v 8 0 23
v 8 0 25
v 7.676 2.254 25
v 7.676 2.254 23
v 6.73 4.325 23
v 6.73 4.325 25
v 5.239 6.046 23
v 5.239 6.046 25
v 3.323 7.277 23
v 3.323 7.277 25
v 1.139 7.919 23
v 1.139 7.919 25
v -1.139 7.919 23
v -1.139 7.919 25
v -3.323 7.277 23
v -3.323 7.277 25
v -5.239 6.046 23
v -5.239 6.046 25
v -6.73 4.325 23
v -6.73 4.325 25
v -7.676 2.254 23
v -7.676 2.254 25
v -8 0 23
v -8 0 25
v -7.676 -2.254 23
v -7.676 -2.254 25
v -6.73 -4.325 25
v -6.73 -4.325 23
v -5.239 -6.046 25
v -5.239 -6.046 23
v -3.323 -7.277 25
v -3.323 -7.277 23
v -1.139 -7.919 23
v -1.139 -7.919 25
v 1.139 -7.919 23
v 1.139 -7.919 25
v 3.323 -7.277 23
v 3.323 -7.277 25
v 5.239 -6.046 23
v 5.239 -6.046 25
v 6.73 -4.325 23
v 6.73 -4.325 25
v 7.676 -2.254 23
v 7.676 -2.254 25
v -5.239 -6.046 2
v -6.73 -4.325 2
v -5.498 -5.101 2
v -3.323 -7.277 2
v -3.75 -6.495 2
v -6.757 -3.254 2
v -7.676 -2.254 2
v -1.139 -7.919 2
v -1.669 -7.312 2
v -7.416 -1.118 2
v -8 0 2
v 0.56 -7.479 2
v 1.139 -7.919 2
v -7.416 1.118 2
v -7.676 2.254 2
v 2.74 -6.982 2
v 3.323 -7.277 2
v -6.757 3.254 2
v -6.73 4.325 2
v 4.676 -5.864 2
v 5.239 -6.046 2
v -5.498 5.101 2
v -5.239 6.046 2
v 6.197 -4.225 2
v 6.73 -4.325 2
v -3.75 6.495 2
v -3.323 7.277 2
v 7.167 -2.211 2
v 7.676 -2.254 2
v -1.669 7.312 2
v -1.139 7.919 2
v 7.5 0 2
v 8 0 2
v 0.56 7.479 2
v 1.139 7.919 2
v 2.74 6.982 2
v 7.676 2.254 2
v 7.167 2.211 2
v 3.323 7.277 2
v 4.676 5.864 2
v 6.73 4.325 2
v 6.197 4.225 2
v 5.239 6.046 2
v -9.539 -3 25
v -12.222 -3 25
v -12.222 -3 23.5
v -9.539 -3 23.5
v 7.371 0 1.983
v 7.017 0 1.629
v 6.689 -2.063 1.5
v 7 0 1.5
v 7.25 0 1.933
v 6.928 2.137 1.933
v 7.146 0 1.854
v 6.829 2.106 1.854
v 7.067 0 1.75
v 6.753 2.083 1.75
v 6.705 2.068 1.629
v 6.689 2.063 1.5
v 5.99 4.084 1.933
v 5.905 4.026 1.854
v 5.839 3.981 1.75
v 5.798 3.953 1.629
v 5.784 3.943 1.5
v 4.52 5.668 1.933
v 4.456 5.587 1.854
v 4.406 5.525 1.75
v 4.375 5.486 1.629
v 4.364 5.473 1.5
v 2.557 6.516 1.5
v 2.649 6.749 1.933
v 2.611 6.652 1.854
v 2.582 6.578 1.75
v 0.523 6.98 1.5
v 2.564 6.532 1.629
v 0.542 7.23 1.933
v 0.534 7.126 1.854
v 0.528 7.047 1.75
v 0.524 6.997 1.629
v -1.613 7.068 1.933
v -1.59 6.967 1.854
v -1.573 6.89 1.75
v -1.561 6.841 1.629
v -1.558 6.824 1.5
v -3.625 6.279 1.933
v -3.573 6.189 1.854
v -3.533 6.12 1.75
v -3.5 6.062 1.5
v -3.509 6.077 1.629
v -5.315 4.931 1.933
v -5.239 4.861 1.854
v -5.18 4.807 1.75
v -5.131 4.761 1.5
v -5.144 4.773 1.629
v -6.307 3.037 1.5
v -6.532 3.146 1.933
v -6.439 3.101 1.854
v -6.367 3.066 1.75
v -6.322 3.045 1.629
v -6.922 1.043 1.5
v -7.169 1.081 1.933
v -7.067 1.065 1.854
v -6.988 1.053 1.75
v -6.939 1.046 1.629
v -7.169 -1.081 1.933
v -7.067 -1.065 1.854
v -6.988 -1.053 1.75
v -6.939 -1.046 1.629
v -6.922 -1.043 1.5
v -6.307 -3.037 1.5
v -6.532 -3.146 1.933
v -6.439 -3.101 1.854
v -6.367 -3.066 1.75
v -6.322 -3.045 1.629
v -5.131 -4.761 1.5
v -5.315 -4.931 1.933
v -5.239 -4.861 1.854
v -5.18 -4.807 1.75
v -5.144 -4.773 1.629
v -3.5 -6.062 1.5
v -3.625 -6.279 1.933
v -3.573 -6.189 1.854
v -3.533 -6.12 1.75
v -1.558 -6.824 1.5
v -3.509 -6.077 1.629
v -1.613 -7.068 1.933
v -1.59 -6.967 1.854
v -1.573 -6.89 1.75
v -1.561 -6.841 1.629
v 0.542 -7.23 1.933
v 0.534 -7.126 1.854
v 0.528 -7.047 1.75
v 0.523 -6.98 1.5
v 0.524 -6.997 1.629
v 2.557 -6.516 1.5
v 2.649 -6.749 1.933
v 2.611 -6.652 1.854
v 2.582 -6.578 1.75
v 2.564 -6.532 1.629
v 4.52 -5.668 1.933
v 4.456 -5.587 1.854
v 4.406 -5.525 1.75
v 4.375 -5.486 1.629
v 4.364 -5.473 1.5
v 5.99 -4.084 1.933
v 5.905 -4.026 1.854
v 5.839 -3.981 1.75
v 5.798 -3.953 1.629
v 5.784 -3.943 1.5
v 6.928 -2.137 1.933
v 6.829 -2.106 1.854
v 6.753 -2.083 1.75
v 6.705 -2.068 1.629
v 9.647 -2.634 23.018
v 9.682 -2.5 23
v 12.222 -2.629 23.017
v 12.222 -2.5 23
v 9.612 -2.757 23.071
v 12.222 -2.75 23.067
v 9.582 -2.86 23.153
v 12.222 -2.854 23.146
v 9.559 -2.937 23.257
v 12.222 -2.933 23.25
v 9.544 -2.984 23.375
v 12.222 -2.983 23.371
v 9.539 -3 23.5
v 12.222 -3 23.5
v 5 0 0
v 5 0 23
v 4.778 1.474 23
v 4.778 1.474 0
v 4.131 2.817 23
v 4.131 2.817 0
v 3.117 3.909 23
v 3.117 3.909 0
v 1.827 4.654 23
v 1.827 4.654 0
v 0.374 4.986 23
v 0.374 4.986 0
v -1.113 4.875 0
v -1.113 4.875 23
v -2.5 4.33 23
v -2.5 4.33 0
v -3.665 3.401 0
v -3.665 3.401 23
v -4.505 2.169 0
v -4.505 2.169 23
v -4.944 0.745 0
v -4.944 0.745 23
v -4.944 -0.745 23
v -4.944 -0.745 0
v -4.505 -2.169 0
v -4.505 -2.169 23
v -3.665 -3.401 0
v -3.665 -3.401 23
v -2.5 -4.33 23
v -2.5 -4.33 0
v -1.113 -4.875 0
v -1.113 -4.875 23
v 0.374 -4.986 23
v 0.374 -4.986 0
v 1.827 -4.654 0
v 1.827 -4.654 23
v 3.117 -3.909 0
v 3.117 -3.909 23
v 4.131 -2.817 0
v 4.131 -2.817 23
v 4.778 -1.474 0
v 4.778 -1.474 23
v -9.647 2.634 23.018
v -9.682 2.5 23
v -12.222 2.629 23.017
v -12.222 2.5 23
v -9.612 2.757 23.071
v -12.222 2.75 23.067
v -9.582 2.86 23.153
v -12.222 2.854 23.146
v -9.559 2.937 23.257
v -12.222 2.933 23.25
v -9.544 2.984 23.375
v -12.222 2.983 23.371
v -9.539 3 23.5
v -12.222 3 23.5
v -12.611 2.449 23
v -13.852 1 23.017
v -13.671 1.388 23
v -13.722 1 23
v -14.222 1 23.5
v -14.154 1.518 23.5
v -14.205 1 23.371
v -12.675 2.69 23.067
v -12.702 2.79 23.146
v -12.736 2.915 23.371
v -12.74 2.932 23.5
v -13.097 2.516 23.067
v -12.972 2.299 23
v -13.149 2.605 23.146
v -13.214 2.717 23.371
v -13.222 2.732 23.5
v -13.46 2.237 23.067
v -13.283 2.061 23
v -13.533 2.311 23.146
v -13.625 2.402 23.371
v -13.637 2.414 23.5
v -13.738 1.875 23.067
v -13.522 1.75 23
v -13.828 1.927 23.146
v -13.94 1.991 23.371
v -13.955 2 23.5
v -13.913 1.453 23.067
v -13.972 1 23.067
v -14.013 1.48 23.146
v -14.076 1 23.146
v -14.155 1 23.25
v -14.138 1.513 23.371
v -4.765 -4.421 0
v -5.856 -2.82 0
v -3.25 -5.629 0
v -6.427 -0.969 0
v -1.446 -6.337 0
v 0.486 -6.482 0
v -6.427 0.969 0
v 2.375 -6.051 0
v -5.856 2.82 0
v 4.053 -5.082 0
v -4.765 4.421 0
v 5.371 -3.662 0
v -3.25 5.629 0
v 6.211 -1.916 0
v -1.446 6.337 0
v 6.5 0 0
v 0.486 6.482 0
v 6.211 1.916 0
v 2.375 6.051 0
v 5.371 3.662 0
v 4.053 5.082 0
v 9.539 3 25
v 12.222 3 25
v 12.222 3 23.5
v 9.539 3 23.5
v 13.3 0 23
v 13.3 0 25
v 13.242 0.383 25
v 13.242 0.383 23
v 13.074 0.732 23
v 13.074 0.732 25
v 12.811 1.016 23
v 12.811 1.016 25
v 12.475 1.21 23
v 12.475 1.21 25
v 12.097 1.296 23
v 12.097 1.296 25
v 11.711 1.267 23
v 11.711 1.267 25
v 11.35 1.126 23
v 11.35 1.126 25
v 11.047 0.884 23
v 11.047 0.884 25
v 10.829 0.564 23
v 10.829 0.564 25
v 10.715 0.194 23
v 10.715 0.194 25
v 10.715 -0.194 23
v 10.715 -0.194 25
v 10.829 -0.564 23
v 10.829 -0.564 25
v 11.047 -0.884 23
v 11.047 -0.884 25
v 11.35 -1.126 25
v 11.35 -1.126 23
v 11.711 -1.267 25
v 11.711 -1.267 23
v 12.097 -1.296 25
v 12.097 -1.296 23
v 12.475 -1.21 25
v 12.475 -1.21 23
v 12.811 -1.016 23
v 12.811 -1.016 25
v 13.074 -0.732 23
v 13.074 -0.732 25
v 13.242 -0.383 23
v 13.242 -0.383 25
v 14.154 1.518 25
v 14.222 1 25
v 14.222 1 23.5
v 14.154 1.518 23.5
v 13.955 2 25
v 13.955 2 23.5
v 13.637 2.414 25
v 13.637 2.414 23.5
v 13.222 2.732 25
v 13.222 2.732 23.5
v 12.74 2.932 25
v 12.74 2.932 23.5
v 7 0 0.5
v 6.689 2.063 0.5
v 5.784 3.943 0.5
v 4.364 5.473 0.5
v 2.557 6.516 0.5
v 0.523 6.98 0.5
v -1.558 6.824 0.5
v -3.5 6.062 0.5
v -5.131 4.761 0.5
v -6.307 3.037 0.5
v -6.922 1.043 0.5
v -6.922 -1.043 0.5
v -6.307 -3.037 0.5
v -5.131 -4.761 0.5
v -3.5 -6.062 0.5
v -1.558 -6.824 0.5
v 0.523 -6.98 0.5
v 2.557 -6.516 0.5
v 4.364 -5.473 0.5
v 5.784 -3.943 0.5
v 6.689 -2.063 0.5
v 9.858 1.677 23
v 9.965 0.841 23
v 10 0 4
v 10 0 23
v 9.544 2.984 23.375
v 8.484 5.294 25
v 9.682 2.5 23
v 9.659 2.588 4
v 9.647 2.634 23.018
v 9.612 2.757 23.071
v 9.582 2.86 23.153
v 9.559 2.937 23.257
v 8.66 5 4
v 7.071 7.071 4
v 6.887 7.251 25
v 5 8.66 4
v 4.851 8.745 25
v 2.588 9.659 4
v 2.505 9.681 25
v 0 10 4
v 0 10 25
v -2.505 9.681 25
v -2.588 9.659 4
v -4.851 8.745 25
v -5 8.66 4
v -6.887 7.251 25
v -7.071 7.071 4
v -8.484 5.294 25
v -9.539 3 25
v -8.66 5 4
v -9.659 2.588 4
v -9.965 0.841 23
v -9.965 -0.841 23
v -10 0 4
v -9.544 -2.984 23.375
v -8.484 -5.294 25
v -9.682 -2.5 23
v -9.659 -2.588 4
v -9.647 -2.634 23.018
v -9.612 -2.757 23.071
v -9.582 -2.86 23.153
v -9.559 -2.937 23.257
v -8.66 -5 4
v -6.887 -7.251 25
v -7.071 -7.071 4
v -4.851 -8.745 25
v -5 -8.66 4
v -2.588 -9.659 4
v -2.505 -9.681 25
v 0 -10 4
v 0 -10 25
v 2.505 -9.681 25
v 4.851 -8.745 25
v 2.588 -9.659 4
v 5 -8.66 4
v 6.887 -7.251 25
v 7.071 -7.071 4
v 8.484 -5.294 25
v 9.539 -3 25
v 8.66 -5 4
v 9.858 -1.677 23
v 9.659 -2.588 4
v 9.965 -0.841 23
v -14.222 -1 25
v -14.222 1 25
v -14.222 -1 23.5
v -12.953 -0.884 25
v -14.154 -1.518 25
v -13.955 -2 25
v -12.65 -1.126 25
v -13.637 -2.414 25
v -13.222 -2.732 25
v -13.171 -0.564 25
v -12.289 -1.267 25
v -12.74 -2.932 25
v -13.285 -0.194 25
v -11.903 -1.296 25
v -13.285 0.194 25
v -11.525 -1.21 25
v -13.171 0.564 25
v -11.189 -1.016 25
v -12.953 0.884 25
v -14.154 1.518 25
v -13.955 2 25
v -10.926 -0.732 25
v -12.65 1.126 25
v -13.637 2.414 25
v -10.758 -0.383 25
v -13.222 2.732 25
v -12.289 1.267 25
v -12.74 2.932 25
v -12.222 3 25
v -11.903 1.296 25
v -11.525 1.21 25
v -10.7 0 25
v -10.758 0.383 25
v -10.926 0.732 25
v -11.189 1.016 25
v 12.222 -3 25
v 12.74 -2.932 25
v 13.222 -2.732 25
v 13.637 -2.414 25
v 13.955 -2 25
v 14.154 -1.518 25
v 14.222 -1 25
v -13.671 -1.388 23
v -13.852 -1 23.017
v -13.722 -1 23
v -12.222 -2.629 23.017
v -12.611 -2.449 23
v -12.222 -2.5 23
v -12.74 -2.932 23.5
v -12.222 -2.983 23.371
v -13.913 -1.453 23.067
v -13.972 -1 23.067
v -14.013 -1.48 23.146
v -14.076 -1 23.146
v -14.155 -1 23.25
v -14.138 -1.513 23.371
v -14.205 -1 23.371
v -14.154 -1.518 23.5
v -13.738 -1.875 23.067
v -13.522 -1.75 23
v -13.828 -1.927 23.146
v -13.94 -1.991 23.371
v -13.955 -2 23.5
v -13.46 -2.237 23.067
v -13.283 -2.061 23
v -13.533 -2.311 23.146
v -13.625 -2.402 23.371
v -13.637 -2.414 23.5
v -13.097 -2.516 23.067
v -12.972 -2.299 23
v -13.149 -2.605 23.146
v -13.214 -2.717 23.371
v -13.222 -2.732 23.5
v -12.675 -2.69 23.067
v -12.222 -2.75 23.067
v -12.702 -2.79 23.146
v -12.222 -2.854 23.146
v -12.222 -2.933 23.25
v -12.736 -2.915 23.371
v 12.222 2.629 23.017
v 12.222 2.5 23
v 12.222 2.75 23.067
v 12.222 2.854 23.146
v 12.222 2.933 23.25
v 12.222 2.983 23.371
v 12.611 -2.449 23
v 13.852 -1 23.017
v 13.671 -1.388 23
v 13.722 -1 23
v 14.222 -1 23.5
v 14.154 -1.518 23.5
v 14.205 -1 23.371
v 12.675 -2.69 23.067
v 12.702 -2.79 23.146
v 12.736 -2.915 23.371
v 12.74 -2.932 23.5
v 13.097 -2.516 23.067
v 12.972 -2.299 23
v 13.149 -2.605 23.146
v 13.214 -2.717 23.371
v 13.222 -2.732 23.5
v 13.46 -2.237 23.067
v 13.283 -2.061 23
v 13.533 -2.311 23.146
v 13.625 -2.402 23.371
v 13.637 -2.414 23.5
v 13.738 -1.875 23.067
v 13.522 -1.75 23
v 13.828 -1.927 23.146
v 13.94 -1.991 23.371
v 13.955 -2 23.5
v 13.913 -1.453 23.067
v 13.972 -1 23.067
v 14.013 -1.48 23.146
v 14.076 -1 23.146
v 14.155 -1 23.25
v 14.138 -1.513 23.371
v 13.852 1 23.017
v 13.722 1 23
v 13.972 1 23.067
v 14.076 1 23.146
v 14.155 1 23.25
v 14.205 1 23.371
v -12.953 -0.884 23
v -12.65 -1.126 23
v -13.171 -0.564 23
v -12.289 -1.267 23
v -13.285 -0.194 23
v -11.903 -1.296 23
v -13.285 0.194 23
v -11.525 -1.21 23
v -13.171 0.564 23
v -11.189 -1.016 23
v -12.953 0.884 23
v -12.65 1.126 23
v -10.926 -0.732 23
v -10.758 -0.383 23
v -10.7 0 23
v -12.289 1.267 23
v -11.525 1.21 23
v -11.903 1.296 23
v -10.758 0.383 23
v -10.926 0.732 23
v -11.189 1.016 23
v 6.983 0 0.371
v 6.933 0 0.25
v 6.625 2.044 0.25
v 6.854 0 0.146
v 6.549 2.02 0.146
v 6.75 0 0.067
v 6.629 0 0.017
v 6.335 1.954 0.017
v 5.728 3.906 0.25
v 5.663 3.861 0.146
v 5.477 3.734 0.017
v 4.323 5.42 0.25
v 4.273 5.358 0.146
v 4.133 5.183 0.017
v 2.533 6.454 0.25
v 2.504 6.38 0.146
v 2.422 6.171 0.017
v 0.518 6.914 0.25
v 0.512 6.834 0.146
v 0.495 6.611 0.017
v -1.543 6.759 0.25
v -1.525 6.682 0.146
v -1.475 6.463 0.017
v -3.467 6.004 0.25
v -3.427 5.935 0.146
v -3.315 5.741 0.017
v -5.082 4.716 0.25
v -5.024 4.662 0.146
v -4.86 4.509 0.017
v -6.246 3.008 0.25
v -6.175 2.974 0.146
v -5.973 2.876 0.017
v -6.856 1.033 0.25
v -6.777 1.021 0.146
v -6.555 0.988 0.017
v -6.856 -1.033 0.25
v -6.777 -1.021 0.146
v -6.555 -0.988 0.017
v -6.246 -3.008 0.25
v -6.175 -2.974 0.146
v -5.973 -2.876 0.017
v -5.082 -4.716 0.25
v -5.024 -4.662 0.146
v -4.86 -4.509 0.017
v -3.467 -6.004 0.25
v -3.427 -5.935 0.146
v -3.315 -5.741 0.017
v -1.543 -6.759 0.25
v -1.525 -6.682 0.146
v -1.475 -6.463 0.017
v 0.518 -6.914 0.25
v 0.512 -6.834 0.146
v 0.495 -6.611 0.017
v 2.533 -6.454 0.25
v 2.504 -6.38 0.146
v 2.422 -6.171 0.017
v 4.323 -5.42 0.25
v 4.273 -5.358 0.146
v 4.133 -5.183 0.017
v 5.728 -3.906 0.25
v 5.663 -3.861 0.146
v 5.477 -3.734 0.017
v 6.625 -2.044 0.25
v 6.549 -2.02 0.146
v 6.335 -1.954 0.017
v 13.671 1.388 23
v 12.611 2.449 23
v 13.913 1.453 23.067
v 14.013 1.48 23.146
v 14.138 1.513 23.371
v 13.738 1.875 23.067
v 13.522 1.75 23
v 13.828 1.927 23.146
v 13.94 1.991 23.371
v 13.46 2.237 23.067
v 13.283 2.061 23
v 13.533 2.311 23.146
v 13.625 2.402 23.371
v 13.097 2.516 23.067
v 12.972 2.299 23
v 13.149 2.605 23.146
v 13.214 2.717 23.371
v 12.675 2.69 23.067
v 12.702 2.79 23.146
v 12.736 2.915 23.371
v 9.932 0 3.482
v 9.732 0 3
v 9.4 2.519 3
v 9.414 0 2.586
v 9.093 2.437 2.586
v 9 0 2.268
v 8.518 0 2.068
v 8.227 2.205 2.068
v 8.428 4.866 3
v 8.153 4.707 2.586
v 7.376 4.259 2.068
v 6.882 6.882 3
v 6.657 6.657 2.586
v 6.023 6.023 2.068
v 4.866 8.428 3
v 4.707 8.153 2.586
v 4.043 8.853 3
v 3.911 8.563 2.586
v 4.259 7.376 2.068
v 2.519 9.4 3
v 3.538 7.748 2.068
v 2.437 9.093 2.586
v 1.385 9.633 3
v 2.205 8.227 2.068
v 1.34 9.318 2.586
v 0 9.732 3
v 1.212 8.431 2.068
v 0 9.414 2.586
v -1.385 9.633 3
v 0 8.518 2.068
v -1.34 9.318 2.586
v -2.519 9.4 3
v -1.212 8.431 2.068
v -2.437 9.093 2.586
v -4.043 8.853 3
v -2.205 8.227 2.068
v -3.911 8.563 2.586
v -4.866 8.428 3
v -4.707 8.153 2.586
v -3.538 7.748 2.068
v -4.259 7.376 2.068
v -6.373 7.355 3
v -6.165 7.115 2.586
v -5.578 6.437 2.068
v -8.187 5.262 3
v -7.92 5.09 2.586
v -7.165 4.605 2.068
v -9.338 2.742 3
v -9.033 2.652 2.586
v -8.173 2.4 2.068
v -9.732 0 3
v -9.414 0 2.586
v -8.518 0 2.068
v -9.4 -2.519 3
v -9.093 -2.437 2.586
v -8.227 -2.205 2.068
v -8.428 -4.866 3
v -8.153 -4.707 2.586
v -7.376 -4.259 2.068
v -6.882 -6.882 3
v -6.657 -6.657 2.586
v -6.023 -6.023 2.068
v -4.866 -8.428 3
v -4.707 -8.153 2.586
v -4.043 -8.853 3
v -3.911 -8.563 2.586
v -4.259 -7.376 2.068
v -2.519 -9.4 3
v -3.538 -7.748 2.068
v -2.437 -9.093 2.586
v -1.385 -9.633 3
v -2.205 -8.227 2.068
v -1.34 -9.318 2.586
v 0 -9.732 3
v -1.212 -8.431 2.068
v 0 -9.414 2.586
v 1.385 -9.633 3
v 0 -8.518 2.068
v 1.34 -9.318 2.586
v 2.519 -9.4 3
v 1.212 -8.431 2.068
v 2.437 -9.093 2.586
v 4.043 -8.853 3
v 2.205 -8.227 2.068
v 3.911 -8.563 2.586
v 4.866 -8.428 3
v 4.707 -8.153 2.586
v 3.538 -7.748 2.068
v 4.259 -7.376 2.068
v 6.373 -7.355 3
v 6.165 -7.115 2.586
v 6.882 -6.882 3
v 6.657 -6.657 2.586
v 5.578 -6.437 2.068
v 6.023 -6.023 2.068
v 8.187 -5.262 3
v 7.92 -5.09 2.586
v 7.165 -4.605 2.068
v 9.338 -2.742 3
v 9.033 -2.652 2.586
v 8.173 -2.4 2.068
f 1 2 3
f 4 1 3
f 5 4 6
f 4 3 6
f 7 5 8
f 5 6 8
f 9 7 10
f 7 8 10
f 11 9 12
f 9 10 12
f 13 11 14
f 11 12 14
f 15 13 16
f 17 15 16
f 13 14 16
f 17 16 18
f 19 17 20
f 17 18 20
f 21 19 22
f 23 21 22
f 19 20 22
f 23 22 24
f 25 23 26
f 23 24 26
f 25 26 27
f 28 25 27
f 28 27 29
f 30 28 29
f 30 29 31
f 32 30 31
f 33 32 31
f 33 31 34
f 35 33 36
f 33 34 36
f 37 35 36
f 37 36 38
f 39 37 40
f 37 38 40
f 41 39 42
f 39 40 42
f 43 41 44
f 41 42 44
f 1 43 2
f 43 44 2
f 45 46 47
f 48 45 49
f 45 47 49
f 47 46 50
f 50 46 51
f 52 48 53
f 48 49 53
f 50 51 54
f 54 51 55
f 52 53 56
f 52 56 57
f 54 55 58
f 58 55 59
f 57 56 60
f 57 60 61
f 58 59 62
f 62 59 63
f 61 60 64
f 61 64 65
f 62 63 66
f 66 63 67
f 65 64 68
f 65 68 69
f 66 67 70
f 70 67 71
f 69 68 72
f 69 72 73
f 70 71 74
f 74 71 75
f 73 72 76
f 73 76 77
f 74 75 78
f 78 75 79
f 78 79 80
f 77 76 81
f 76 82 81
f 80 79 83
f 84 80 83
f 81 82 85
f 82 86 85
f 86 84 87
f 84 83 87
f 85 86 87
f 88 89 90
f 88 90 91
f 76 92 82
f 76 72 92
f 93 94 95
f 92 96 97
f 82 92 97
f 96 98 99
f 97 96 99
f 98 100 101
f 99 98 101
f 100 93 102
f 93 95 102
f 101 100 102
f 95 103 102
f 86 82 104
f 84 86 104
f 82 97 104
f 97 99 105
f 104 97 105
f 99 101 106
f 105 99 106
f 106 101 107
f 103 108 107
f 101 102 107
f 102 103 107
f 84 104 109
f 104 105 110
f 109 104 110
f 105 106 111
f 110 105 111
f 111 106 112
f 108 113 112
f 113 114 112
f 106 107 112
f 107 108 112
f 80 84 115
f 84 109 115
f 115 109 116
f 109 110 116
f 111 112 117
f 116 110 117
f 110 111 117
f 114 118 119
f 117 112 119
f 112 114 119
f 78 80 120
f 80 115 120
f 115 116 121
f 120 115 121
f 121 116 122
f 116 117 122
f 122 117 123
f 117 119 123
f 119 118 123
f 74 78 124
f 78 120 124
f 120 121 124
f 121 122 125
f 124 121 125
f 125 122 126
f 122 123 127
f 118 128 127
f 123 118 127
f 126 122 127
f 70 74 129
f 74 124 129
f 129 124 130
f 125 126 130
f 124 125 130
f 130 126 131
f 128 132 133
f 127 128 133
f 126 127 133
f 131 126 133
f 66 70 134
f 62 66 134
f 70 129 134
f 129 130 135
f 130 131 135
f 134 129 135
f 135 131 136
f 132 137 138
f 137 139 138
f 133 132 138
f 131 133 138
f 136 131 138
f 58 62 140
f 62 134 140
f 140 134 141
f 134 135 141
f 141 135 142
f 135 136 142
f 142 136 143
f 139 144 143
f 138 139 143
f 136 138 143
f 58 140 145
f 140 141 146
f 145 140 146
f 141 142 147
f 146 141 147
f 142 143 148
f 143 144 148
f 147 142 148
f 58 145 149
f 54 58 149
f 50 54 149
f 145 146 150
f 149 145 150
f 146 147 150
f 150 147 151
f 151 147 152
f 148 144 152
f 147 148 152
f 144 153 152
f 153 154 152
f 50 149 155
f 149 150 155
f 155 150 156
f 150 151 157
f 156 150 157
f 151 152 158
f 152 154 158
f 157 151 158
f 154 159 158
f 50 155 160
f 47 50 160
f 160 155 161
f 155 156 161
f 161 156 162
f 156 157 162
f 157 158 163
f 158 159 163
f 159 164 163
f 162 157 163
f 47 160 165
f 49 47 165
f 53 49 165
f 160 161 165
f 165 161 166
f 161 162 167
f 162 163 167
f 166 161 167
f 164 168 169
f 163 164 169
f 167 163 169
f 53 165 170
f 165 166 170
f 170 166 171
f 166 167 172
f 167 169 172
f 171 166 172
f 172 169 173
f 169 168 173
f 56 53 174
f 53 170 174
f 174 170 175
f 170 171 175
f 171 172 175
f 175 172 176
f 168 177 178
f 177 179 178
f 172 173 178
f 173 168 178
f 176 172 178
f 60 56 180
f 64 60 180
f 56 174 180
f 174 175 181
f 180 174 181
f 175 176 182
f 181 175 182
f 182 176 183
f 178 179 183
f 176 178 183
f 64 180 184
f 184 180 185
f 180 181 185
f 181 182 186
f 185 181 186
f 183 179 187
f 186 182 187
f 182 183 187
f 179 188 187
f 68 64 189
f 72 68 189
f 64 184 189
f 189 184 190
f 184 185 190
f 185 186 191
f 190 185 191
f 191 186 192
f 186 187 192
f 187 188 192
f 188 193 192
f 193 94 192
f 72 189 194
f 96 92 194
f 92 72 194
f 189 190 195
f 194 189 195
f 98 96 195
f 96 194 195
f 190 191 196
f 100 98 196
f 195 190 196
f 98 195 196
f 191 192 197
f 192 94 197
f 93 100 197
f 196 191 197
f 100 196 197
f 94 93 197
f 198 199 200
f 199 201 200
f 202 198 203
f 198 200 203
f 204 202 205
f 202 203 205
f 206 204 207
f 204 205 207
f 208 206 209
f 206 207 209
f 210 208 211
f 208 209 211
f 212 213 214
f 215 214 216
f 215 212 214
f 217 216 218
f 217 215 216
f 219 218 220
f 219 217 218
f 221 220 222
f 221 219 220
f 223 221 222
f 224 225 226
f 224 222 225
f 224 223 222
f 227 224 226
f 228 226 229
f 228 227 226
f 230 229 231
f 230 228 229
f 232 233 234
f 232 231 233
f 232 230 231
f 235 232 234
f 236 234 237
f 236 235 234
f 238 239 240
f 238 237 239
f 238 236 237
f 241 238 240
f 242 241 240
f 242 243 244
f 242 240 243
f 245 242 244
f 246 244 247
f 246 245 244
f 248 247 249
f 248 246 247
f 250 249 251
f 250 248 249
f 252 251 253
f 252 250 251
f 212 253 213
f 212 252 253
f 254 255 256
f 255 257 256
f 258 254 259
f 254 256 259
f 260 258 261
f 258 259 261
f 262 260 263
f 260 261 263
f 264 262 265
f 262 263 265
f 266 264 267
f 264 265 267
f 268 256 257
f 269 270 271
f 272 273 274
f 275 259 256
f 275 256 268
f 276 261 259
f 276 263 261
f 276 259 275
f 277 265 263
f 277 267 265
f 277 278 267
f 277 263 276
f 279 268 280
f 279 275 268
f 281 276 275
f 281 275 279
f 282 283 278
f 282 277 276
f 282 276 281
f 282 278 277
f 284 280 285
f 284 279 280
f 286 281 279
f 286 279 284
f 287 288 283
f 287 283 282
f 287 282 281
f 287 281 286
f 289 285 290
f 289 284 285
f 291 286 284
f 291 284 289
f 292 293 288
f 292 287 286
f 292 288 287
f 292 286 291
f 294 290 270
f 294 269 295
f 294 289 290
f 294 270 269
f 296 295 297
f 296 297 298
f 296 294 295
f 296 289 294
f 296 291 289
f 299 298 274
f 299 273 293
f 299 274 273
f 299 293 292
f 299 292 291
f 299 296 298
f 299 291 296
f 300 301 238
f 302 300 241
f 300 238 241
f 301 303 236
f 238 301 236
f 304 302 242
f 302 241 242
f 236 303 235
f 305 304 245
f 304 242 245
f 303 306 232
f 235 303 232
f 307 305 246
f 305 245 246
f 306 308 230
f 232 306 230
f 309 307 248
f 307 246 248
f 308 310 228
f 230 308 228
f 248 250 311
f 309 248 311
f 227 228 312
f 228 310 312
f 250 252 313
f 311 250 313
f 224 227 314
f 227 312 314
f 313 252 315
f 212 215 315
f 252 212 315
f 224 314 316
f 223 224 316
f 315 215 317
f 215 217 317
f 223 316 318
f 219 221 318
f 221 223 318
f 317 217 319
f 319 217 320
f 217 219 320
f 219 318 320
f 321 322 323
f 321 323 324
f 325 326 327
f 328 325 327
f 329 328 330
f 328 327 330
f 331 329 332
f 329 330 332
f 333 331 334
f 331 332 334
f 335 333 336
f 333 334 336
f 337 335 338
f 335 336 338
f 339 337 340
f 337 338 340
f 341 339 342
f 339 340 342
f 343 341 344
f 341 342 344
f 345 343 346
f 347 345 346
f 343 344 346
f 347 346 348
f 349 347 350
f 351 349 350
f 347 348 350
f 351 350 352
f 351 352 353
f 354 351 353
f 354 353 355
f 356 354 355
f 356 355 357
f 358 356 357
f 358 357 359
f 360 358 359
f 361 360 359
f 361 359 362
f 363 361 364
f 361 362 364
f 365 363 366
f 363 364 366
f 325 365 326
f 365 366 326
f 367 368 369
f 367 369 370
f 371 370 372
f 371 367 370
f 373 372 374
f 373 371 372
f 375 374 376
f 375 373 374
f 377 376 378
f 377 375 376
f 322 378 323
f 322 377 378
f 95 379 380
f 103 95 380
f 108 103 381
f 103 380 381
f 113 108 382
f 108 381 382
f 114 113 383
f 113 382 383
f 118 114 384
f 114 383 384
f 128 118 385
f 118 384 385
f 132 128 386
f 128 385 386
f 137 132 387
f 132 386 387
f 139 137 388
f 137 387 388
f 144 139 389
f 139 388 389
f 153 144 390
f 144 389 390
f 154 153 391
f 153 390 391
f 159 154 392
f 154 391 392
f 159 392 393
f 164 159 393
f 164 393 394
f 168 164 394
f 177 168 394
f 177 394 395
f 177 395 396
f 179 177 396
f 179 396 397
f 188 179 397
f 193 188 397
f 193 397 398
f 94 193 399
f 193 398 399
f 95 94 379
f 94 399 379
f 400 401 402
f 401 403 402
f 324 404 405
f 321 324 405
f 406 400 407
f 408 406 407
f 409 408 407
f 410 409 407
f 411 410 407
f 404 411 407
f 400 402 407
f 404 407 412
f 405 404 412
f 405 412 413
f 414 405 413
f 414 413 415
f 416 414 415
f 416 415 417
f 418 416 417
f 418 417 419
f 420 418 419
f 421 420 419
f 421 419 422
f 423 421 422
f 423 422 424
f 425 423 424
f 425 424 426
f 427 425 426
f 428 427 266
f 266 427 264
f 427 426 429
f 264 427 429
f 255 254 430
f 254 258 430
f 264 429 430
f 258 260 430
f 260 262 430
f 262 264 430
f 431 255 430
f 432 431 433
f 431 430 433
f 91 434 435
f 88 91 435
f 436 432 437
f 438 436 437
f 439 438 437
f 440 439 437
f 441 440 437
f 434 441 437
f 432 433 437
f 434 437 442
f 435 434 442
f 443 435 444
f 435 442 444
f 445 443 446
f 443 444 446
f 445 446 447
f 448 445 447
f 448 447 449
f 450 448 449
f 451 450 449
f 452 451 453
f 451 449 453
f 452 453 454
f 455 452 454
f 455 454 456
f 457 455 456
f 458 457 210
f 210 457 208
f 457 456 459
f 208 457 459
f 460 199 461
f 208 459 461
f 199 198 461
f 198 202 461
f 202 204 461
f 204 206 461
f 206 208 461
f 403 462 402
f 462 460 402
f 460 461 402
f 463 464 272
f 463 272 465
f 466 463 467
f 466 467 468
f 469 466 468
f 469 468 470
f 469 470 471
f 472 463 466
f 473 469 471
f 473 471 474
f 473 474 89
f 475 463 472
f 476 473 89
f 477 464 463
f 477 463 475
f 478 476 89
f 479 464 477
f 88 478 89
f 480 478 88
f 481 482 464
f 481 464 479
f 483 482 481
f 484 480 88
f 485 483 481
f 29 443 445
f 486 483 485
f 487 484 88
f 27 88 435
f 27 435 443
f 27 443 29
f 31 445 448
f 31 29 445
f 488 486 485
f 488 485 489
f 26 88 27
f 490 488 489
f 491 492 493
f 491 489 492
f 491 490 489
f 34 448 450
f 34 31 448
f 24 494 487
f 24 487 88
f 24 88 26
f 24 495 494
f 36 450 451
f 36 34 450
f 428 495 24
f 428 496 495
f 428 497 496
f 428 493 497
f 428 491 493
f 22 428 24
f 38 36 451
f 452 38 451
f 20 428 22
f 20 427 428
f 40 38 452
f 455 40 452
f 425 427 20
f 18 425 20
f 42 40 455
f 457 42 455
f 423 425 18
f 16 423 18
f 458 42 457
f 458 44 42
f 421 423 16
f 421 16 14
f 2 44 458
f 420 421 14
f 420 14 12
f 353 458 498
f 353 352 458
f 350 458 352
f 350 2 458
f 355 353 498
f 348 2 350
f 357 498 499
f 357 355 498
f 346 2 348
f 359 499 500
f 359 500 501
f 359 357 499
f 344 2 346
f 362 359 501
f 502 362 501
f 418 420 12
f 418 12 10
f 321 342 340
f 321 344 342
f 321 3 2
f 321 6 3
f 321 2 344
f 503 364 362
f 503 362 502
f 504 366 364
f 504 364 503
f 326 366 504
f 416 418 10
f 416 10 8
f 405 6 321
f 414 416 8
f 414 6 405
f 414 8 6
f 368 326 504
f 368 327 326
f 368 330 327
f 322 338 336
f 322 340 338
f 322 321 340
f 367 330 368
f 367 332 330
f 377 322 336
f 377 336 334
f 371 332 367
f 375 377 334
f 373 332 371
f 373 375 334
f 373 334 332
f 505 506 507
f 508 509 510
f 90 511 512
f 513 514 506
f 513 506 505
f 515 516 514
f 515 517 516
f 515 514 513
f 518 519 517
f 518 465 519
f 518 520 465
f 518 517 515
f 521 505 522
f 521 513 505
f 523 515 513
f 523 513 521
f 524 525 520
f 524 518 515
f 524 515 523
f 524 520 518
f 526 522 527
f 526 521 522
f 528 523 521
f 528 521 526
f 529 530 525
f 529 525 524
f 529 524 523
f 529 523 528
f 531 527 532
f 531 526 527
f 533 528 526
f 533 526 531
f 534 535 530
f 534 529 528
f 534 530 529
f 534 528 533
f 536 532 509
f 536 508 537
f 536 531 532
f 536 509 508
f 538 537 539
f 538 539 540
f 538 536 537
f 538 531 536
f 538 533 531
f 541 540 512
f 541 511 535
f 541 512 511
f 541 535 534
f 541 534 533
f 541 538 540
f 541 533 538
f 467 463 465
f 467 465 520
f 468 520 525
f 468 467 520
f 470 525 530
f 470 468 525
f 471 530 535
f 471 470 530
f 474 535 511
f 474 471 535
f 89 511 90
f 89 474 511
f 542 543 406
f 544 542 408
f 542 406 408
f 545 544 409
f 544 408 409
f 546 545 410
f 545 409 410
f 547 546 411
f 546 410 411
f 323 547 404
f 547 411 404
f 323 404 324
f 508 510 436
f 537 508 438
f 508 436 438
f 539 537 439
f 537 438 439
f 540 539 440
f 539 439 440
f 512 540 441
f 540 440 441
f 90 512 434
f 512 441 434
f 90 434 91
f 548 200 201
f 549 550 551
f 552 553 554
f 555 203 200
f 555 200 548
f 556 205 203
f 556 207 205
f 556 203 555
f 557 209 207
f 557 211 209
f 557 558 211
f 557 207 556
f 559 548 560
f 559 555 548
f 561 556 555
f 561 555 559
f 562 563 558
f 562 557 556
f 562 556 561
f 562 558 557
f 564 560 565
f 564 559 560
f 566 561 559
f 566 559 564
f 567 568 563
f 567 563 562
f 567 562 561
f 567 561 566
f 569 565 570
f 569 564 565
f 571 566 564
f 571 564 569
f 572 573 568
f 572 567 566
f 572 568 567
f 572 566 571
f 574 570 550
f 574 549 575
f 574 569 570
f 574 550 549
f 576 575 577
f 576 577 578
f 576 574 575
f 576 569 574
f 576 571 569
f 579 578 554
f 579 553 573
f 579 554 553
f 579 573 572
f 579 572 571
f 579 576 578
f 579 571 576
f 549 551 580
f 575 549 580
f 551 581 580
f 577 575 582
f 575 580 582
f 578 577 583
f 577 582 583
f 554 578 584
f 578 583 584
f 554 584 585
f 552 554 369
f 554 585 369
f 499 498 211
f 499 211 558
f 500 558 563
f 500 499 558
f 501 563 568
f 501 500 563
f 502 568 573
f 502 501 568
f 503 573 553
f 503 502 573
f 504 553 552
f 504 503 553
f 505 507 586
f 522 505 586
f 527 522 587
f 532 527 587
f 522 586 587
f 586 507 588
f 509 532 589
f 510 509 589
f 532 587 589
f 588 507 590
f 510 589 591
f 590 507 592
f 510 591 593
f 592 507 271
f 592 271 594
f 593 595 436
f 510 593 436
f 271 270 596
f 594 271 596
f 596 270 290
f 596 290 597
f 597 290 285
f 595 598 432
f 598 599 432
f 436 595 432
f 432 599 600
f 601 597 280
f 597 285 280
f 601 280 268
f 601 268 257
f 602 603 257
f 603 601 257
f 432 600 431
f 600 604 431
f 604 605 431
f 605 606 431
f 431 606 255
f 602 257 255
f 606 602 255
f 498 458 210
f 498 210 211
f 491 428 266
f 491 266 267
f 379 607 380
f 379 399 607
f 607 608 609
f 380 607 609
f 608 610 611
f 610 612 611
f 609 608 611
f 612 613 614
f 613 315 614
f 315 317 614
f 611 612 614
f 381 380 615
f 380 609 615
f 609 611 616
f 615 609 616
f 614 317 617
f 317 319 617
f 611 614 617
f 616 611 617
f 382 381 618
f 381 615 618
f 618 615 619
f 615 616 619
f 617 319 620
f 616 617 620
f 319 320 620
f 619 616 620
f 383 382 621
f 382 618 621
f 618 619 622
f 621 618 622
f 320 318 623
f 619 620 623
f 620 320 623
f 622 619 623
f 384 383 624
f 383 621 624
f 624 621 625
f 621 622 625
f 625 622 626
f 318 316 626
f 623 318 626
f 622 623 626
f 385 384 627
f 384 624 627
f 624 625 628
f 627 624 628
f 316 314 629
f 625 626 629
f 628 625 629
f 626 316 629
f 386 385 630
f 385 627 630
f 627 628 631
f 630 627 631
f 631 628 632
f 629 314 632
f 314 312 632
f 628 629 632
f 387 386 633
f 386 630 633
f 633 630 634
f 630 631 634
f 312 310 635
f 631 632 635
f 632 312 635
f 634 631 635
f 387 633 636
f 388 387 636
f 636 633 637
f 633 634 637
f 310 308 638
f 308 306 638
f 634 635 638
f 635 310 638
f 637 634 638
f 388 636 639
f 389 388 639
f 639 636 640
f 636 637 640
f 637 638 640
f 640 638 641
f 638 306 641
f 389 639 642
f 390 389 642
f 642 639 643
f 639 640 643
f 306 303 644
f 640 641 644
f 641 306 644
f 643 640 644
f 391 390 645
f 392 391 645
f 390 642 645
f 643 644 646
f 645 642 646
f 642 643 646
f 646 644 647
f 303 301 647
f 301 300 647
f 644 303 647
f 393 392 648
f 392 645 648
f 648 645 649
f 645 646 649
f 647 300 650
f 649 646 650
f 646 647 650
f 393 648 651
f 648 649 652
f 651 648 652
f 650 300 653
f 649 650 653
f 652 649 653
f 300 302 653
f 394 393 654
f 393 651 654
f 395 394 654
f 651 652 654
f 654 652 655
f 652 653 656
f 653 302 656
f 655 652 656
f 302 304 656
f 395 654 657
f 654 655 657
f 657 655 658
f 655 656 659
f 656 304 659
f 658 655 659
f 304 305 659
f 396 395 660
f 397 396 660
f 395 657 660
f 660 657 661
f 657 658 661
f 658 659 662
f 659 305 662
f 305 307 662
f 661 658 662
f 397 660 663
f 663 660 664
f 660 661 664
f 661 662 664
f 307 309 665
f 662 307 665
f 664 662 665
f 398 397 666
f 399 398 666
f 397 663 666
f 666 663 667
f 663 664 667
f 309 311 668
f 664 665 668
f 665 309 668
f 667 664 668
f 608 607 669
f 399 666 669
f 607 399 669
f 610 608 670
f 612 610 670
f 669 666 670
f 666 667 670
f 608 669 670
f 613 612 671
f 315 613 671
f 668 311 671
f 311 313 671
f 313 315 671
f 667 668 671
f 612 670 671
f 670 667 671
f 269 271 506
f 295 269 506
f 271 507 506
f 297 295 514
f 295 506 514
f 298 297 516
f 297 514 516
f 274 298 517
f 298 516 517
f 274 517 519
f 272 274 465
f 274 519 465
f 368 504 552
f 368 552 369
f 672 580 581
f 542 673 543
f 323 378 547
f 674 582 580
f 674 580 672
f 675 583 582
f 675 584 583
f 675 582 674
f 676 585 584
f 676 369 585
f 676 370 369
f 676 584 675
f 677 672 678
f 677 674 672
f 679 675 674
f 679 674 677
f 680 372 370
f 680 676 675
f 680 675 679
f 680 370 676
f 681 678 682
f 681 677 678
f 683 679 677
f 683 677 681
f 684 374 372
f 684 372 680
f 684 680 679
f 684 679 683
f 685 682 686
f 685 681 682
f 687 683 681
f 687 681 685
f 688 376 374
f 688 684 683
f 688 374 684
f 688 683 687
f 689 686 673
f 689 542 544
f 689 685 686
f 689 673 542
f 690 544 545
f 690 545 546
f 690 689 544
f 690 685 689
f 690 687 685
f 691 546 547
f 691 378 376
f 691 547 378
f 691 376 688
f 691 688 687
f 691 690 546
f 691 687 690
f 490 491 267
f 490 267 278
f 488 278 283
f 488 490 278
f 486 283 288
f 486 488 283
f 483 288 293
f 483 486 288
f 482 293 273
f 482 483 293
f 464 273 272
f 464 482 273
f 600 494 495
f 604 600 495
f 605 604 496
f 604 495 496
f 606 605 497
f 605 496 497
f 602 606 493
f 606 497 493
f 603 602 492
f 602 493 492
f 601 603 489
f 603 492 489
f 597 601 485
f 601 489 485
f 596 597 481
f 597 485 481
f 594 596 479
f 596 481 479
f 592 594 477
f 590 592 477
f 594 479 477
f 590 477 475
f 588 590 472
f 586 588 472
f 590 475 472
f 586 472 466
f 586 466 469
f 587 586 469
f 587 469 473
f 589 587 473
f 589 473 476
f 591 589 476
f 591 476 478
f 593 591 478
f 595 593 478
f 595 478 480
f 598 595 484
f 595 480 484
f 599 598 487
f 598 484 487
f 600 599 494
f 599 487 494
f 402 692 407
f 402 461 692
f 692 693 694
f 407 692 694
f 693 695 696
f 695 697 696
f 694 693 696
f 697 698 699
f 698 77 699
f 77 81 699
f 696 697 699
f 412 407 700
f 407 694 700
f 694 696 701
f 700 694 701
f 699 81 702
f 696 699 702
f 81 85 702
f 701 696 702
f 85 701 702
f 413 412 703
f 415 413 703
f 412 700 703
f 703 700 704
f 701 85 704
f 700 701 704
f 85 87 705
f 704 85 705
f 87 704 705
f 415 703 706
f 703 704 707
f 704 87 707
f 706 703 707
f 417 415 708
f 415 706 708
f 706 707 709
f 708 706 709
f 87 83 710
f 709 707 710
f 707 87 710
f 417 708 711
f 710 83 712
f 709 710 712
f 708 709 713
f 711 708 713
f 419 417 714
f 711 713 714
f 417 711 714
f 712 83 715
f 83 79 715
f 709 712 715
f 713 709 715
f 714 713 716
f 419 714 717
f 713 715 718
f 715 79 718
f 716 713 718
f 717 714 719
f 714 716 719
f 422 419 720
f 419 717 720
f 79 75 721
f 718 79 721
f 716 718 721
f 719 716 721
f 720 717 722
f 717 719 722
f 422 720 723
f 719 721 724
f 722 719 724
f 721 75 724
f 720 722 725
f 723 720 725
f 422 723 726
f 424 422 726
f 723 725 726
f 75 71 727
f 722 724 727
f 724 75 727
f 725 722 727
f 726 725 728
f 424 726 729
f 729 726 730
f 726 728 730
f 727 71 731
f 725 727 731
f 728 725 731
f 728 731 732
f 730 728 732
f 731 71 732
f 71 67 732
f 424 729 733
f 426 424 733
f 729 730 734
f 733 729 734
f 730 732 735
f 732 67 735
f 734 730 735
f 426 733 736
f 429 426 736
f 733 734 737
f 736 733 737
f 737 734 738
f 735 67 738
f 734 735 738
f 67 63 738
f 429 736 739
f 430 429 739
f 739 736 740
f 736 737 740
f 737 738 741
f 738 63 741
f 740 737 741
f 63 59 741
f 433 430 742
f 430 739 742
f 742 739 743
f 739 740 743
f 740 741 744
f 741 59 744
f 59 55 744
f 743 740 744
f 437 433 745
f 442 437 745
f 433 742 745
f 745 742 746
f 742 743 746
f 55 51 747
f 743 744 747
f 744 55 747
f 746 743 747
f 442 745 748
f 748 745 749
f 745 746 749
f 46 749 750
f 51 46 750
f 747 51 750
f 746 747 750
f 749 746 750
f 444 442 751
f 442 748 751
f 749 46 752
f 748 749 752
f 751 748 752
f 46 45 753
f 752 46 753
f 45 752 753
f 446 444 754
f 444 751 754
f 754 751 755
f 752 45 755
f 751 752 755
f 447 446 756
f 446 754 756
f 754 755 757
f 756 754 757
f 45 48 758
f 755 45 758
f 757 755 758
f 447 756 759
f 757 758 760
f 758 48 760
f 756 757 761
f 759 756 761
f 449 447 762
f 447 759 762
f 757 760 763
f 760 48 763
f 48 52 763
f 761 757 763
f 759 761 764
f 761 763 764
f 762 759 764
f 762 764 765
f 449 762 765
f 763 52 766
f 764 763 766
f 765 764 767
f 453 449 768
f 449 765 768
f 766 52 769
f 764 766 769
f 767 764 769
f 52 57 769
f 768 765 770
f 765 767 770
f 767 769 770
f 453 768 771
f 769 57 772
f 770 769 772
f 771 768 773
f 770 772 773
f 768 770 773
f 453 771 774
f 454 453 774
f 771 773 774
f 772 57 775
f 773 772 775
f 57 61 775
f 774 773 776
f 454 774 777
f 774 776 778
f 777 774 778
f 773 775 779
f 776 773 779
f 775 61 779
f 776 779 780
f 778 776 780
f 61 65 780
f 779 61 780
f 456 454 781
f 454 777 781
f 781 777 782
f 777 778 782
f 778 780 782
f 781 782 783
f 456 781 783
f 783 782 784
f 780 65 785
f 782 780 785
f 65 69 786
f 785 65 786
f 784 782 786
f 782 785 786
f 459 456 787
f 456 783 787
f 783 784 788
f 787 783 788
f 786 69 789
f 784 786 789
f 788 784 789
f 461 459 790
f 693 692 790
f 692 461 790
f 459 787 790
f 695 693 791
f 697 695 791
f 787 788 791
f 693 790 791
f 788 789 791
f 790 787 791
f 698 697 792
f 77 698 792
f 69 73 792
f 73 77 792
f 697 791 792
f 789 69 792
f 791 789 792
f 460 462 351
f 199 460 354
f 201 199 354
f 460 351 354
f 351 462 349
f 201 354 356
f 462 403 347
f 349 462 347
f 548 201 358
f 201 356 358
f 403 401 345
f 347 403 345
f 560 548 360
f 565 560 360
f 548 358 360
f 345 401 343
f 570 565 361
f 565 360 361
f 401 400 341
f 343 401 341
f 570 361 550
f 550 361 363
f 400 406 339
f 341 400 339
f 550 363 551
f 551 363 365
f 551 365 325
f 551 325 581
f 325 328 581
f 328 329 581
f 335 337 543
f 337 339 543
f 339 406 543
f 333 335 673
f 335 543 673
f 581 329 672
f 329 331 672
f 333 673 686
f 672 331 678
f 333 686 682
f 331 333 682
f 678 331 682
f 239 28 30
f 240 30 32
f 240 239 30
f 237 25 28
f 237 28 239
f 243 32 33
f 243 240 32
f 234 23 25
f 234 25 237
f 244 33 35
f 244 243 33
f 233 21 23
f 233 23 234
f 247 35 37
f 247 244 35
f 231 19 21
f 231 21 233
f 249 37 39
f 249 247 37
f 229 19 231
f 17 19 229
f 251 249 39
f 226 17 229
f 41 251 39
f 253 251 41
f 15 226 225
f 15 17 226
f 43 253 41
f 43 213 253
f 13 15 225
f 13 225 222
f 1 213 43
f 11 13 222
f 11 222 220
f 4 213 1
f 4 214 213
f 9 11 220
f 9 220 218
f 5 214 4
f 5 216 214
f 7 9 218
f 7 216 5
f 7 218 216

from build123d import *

# Parameters (mm, degrees)
SKETCH1_R               = 10
BOSS_EXTRUDE1_DEPTH     = 25
SKETCH1_3_R             = 5
CUT_EXTRUDE2_DEPTH      = 26
CUT_EXTRUDE2_DEPTH_BACK = 25
SKETCH1_7_R             = 10
SKETCH1_7_R_2           = 7
SKETCH1_7_R_3           = 5
CUT_EXTRUDE3_DEPTH      = 2
SKETCH5_R               = 8
CUT_EXTRUDE4_DEPTH      = 2
SKETCH6_R               = 1.3
BOSS_EXTRUDE2_DEPTH     = 2
FILLET1_R               = 2
FILLET2_R               = 0.5


with BuildPart() as part:
    # Sketch1 → Boss-Extrude1 (new body)
    with BuildSketch(Plane.XY):
        Circle(SKETCH1_R)
    extrude(amount=BOSS_EXTRUDE1_DEPTH)

    # Sketch1<3> → Cut-Extrude2 (cut, two sides)
    with BuildSketch(Plane.XY) as cut_extrude2_sk:
        Circle(SKETCH1_3_R)
    extrude(amount=CUT_EXTRUDE2_DEPTH, mode=Mode.SUBTRACT)
    extrude(cut_extrude2_sk.sketch, amount=-CUT_EXTRUDE2_DEPTH_BACK, mode=Mode.SUBTRACT)

    # Sketch1<7> → Cut-Extrude3 (cut)
    with BuildSketch(Plane.XY):
        Circle(SKETCH1_7_R)
        Circle(SKETCH1_7_R_2, mode=Mode.SUBTRACT)
        Circle(SKETCH1_7_R_3)
    extrude(amount=CUT_EXTRUDE3_DEPTH, mode=Mode.SUBTRACT)

    # Sketch5 → Cut-Extrude4 (cut)
    with BuildSketch(Plane.XY.offset(25)):
        Circle(SKETCH5_R)
    extrude(amount=-CUT_EXTRUDE4_DEPTH, mode=Mode.SUBTRACT)

    # Sketch6 → Boss-Extrude2 (add)
    with BuildSketch(Plane.XY.offset(25)):
        with BuildLine():
            Line((-14.222467655, 1), (-14.222467655, -1))
            ThreePointArc((-14.222467655, -1), (-13.636681217, -2.414213562), (-12.222467655, -3))
            Line((-12.222467655, -3), (-9.539392014, -3))
            ThreePointArc((-9.539392014, -3), (-10, 0), (-9.539392014, 3))
            Line((-9.539392014, 3), (-12.222467655, 3))
            ThreePointArc((-12.222467655, 3), (-13.636681217, 2.414213562), (-14.222467655, 1))
        make_face()
        with Locations((-12, 0)):
            Circle(SKETCH6_R, mode=Mode.SUBTRACT)
        with BuildLine():
            ThreePointArc((10, 0), (9.884177258, -1.517576993), (9.539392014, -3))
            Line((9.539392014, -3), (12.222467655, -3))
            ThreePointArc((12.222467655, -3), (13.636681217, -2.414213562), (14.222467655, -1))
            Line((14.222467655, -1), (14.222467655, 1))
            ThreePointArc((14.222467655, 1), (13.636681217, 2.414213562), (12.222467655, 3))
            Line((12.222467655, 3), (9.539392014, 3))
            ThreePointArc((9.539392014, 3), (9.884177258, 1.517576993), (10, 0))
        make_face()
        with Locations((12, 0)):
            Circle(SKETCH6_R, mode=Mode.SUBTRACT)
    extrude(amount=-BOSS_EXTRUDE2_DEPTH)

    # Fillet1
    fillet1_edges = [part.edges().sort_by_distance(p)[0] for p in [
        (-10, 0, 2),
    ]]
    fillet(fillet1_edges, radius=FILLET1_R)

    # Fillet2
    fillet2_edges = [part.edges().sort_by_distance(p)[0] for p in [
        (-7, 0, 2),
        (-7, 0, 0),
        (-13.636681217, 2.414213562, 23),
        (-10.880929834, -3, 23),
        (-13.636681217, -2.414213562, 23),
        (-14.222467655, 0, 23),
        (-10.880929834, 3, 23),
        (14.222467655, 0, 23),
        (13.636681217, -2.414213562, 23),
        (10.880929834, 3, 23),
        (13.636681217, 2.414213562, 23),
        (10.880929834, -3, 23),
    ]]
    fillet(fillet2_edges, radius=FILLET2_R)


solid = part.part
